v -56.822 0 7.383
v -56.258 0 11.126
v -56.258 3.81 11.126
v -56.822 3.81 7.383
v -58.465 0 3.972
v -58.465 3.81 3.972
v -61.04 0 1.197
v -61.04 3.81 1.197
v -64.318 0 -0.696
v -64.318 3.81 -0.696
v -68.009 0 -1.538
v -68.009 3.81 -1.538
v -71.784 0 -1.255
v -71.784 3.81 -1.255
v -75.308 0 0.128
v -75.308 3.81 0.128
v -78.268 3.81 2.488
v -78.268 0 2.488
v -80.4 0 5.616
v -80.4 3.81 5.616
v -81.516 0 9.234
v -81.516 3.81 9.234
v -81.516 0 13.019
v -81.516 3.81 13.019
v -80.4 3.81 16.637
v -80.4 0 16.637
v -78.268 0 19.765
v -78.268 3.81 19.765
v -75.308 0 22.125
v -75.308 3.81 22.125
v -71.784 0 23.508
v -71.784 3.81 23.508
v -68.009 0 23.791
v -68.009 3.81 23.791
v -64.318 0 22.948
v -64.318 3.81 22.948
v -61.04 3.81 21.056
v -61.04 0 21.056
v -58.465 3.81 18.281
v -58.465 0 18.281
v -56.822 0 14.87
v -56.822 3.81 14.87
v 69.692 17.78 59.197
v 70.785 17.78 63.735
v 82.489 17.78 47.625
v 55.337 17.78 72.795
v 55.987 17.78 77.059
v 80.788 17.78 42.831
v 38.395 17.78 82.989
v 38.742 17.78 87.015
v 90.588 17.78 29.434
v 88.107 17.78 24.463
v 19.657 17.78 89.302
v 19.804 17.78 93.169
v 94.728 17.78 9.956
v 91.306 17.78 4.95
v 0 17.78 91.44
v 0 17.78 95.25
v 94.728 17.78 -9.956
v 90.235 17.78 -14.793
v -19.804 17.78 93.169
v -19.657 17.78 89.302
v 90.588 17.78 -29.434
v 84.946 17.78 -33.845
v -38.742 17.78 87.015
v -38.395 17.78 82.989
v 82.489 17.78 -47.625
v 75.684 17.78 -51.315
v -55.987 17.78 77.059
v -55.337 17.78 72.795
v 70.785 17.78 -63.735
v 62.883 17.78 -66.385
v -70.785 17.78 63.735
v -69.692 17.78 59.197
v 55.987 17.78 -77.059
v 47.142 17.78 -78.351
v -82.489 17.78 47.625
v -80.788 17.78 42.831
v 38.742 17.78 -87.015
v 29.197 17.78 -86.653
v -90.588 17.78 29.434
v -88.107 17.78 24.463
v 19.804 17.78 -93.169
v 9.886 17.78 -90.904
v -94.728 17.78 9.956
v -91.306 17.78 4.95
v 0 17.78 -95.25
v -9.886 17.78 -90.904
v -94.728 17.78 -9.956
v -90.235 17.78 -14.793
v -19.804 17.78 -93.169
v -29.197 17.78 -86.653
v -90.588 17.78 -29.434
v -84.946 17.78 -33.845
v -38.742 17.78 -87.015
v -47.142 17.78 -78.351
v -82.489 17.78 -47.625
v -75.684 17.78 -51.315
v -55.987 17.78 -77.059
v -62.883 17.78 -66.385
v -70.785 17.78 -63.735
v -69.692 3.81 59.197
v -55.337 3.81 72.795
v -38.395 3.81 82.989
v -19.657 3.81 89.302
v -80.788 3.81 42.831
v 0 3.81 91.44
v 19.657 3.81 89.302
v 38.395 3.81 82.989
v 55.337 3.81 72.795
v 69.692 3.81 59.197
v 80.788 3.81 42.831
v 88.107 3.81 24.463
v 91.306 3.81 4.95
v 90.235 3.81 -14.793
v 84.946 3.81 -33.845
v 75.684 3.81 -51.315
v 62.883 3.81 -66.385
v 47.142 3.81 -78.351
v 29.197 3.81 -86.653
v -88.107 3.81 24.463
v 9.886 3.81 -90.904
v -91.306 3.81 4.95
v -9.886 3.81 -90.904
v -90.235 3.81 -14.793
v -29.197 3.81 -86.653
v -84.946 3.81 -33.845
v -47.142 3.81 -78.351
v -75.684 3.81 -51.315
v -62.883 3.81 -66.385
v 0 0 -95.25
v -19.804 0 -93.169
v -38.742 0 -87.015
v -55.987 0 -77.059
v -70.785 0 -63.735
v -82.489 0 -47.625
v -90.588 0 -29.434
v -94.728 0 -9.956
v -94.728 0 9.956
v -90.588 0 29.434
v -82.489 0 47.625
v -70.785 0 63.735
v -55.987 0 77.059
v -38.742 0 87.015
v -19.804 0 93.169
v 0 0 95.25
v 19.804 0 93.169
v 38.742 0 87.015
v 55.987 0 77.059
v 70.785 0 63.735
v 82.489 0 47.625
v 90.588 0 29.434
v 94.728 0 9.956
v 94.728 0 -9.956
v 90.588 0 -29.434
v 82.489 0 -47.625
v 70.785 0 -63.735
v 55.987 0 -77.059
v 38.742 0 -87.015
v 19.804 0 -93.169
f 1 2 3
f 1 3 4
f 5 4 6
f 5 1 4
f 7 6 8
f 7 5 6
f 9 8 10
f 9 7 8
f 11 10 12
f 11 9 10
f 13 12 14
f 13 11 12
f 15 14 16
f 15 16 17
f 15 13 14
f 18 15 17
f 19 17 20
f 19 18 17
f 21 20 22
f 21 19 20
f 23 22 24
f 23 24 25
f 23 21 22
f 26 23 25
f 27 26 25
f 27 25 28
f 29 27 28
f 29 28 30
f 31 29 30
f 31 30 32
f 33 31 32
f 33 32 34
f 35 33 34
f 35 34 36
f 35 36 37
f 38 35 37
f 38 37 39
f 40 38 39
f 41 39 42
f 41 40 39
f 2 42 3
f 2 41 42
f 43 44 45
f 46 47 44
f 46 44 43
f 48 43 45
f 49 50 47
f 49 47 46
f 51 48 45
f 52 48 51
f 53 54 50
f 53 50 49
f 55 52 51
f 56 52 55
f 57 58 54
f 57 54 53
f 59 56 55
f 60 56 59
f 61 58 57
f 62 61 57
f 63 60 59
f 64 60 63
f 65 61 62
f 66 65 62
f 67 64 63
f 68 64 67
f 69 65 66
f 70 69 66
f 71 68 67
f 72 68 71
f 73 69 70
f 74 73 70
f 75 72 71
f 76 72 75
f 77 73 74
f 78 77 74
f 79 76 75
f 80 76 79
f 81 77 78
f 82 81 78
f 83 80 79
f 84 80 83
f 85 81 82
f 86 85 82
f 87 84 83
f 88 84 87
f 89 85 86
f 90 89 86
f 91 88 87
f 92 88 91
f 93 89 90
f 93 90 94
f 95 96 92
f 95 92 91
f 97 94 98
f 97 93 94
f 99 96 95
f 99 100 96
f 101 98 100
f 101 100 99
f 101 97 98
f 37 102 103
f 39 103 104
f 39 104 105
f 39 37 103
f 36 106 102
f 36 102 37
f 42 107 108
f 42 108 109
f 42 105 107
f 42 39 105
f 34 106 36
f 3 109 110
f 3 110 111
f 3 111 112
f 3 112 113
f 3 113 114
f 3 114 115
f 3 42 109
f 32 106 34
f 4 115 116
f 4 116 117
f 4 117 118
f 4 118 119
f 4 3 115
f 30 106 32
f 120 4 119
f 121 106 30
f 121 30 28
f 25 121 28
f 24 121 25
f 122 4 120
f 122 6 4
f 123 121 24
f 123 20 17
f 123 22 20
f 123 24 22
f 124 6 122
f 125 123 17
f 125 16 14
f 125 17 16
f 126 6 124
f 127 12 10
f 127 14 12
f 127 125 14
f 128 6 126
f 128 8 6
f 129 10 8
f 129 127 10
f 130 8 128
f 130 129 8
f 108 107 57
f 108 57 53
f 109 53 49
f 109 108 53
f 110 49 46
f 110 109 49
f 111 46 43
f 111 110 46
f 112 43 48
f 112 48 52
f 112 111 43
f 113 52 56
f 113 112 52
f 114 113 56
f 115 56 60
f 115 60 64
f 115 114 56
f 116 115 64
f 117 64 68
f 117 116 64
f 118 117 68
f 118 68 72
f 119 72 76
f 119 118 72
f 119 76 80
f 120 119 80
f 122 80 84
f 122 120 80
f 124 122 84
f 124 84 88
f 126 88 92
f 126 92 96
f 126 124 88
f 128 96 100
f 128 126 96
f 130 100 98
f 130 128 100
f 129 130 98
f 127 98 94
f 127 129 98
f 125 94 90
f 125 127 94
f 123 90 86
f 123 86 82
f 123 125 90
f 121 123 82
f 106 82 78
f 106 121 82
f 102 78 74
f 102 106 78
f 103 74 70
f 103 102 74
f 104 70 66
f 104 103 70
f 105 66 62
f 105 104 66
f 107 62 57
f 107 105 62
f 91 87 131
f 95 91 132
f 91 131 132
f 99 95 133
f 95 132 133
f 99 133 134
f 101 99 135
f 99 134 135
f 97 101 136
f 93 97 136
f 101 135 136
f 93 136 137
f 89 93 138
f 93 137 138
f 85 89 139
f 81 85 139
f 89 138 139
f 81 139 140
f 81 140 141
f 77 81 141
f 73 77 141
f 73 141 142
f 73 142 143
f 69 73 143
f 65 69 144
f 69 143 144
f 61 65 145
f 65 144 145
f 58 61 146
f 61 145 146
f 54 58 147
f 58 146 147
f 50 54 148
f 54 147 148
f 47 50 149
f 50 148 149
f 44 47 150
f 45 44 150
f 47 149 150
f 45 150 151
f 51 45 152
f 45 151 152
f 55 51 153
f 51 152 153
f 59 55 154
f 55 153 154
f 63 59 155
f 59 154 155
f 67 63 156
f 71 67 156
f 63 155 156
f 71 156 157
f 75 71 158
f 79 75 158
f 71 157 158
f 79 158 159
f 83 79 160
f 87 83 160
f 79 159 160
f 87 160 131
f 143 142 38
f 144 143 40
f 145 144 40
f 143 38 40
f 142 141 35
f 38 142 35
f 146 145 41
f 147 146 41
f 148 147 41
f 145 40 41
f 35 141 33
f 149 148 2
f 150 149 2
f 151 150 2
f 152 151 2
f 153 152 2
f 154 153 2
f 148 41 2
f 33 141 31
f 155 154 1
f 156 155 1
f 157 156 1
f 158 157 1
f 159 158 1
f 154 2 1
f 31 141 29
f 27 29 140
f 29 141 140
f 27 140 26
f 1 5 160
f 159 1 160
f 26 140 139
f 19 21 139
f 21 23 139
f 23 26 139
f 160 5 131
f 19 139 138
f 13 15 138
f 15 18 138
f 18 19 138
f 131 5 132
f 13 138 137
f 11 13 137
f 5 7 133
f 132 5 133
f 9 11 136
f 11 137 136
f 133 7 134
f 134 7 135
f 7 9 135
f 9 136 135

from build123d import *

# Parameters (mm, degrees)
SKETCH1_R           = 95.25
BOSS_EXTRUDE1_DEPTH = 3.81
SKETCH2_R           = 95.25
SKETCH2_R_2         = 91.44
BOSS_EXTRUDE2_DEPTH = 13.97
HOLE1_OUTLINE_R     = 12.7
HOLE1_DEPTH         = 3.81


# Read off the part's stored shape, not the designer's step: Hole1
with BuildPart() as part:
    # Sketch1 → Boss-Extrude1 (new body)
    with BuildSketch(Plane(origin=(0, 0, 0), x_dir=(1, 0, 0), z_dir=(0, 1, 0))):
        with Locations(Location((0, 0, 0), (0, 0, 90))):
            Circle(SKETCH1_R)
    extrude(amount=BOSS_EXTRUDE1_DEPTH)

    # Sketch2 → Boss-Extrude2 (add)
    with BuildSketch(Plane(origin=(0, 3.81, 0), x_dir=(1, 0, 0), z_dir=(0, 1, 0))):
        with Locations(Location((0, 0, 0), (0, 0, 90))):
            Circle(SKETCH2_R)
        with Locations(Location((0, 0, 0), (0, 0, 270))):
            Circle(SKETCH2_R_2, mode=Mode.SUBTRACT)
    extrude(amount=BOSS_EXTRUDE2_DEPTH)

    # Hole1 outline → Hole1 (cut)
    with BuildSketch(Plane(origin=(0, 0, 0), x_dir=(1, 0, 0), z_dir=(0, 1, 0))):
        with Locations((-68.958152294, -11.126353047)):
            Circle(HOLE1_OUTLINE_R)
    extrude(amount=HOLE1_DEPTH, mode=Mode.SUBTRACT)


solid = part.part
